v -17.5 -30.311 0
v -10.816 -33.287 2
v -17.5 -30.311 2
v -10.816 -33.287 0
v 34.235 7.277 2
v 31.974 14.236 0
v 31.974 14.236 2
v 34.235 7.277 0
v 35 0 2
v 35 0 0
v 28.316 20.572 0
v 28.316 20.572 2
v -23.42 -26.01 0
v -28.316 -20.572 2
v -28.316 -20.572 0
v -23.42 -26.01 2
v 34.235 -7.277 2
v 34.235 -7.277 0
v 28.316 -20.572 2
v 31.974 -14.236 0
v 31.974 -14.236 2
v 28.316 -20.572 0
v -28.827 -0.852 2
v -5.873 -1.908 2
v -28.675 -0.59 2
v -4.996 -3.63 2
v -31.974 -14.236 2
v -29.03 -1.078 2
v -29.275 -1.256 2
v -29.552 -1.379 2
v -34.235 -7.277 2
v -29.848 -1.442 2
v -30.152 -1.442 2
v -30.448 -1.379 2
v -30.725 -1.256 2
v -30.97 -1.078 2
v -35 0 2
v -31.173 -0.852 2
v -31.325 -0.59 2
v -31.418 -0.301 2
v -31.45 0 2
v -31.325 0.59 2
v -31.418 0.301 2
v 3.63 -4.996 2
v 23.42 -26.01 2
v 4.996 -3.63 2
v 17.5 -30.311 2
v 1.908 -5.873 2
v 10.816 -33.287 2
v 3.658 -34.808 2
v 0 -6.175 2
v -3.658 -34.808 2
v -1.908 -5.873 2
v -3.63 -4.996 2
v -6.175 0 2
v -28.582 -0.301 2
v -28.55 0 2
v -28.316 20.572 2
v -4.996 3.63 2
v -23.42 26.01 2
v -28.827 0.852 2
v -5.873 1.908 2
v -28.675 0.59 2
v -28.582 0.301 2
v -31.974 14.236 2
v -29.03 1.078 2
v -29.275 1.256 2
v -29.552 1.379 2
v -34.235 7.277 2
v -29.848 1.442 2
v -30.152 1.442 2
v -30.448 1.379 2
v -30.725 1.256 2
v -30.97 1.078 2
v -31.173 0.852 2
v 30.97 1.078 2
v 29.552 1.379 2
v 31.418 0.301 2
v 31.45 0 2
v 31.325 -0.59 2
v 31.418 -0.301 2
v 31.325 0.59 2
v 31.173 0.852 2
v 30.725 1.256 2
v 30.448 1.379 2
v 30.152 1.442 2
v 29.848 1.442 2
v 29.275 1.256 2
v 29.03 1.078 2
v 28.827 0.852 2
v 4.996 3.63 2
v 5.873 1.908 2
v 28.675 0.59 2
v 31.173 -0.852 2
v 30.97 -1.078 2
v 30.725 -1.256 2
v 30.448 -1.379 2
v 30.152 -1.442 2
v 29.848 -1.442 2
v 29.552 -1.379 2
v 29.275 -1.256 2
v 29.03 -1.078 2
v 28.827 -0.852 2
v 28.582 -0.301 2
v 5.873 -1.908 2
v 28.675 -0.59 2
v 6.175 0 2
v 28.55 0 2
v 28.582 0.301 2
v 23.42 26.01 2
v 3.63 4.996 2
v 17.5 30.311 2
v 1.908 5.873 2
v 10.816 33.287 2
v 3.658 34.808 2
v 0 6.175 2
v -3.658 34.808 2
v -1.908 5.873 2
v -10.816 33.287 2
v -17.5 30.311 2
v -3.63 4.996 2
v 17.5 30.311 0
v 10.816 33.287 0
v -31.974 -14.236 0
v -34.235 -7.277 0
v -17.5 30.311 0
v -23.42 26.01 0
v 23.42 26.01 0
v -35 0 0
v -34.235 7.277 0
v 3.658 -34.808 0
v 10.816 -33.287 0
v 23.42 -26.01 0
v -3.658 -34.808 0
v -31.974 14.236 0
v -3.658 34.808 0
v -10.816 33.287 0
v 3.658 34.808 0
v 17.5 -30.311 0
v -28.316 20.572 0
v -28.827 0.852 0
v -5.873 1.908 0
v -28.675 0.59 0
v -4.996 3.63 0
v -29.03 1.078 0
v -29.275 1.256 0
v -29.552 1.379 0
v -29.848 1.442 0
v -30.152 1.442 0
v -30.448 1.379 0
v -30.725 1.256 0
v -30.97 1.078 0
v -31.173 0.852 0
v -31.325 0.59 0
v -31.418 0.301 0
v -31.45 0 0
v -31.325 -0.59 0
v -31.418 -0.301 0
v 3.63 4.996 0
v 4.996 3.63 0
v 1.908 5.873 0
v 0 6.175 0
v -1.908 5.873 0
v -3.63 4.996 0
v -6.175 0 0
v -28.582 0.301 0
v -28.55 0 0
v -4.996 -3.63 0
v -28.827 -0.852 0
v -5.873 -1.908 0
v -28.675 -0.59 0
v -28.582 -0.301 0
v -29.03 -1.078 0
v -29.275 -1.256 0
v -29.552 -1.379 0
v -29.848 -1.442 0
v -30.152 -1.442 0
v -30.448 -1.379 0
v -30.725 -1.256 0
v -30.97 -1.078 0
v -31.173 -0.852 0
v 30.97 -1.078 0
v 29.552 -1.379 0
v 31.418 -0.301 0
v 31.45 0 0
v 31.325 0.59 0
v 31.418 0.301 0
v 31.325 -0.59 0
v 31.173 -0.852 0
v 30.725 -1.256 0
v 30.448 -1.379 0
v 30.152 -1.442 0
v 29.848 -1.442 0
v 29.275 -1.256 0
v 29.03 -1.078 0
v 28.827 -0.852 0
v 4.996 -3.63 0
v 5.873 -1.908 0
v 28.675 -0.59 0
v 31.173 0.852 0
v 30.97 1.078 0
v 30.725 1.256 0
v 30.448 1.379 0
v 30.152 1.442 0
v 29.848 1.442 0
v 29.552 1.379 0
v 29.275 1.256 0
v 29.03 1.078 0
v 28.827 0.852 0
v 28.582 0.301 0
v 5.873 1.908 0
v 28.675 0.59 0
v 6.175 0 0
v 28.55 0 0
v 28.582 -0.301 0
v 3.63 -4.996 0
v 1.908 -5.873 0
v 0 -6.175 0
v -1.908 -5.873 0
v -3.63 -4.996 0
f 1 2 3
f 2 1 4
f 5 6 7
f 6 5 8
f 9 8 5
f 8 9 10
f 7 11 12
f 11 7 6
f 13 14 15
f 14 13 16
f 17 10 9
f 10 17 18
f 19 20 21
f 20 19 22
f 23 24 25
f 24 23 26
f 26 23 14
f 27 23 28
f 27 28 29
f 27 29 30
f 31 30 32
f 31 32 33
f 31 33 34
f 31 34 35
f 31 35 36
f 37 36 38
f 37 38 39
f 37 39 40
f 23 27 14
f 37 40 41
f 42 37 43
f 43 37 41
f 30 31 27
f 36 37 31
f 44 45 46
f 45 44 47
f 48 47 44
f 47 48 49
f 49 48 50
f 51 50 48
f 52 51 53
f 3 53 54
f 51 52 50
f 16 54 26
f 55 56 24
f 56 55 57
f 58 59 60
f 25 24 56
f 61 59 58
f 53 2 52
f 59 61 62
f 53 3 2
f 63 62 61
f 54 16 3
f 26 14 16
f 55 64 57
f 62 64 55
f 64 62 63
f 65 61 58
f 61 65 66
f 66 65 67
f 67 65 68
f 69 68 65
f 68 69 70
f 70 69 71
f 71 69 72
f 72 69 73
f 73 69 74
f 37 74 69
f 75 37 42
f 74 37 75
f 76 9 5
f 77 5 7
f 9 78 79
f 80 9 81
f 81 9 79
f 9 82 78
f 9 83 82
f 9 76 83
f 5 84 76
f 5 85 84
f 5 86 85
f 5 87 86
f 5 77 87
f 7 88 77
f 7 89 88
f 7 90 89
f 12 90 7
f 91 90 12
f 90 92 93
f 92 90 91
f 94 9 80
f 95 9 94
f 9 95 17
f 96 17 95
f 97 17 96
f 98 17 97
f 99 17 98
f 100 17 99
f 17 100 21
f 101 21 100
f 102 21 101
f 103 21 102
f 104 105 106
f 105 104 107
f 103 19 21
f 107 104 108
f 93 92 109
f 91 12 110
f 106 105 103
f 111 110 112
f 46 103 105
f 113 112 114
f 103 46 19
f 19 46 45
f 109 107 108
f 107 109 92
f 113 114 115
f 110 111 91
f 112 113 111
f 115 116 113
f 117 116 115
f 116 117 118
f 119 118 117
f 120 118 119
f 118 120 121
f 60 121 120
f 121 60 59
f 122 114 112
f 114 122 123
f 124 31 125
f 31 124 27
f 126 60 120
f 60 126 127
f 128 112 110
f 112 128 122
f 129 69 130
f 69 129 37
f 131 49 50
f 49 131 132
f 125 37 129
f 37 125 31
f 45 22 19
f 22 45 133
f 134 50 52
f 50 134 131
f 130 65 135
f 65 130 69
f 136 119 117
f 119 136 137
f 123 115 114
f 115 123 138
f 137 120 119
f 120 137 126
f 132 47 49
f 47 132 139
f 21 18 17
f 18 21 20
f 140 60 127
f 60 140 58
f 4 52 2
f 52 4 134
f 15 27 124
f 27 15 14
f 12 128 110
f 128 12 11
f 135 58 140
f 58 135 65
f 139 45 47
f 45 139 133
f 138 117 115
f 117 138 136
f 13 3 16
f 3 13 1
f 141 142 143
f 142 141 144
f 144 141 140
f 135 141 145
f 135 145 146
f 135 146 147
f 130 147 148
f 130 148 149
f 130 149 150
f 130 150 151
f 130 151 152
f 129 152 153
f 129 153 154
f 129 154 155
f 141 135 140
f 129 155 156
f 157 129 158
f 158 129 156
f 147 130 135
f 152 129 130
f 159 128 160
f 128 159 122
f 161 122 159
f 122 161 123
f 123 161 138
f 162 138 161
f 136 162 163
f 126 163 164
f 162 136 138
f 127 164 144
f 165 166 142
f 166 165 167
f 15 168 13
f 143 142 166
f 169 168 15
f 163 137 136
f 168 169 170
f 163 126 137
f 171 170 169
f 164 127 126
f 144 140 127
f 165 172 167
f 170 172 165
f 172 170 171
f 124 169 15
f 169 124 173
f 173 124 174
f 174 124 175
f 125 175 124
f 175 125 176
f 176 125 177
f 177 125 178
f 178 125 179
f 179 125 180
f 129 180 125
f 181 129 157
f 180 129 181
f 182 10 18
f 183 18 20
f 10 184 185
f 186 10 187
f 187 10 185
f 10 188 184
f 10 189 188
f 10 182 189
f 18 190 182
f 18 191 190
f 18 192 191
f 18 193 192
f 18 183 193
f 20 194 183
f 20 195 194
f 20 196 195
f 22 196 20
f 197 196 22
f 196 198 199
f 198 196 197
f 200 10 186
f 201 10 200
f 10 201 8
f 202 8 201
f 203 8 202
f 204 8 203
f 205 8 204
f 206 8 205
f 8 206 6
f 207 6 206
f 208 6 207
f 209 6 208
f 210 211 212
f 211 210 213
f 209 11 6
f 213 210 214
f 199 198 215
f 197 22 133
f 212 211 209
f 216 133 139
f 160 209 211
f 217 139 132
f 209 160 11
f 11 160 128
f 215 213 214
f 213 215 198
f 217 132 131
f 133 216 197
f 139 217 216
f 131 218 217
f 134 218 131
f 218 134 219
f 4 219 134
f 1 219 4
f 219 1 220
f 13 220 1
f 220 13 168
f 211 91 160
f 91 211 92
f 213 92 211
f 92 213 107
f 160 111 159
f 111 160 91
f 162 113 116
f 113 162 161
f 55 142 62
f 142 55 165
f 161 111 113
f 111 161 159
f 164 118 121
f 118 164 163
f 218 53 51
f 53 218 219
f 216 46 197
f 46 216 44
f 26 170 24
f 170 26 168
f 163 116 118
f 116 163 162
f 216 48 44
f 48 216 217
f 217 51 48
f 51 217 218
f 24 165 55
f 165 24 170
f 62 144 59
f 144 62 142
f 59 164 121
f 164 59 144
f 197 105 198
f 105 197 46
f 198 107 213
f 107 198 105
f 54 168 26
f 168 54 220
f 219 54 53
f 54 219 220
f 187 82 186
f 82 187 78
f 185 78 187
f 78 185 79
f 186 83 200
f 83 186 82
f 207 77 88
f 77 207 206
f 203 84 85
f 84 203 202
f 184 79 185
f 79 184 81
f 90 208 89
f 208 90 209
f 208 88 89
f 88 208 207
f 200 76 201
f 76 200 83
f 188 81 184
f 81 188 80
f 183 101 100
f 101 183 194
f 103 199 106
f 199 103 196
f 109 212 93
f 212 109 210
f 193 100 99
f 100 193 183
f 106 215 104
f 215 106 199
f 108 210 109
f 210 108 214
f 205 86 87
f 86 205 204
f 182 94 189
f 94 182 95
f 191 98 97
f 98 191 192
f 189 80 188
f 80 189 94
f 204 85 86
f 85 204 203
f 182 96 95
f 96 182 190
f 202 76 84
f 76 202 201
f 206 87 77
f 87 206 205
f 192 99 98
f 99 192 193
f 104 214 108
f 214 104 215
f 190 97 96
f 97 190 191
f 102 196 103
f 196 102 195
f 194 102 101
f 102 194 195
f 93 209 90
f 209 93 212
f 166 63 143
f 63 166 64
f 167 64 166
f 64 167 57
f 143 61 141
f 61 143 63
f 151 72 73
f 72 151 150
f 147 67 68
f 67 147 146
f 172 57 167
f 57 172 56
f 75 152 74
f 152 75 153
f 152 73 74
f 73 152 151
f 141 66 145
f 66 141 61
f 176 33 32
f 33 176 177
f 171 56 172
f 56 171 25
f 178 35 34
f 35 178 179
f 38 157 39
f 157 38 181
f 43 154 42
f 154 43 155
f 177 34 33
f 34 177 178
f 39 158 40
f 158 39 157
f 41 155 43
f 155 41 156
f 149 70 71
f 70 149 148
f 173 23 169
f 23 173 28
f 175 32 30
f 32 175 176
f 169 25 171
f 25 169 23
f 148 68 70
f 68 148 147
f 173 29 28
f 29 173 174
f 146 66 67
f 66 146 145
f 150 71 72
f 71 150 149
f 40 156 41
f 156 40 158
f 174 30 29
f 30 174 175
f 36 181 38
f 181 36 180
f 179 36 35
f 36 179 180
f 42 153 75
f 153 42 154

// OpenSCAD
height=2;
bolt=(12.55-0.2)/2;

difference(){
   cylinder(height,70/2,70/2);
   cylinder(height,bolt,bolt);
    translate([30,0,0]) cylinder(height,2.9/2,2.9/2,$fs=0.3);
    translate([-30,0,0]) cylinder(height,2.9/2	,2.9/2,$fs=0.3);
}
